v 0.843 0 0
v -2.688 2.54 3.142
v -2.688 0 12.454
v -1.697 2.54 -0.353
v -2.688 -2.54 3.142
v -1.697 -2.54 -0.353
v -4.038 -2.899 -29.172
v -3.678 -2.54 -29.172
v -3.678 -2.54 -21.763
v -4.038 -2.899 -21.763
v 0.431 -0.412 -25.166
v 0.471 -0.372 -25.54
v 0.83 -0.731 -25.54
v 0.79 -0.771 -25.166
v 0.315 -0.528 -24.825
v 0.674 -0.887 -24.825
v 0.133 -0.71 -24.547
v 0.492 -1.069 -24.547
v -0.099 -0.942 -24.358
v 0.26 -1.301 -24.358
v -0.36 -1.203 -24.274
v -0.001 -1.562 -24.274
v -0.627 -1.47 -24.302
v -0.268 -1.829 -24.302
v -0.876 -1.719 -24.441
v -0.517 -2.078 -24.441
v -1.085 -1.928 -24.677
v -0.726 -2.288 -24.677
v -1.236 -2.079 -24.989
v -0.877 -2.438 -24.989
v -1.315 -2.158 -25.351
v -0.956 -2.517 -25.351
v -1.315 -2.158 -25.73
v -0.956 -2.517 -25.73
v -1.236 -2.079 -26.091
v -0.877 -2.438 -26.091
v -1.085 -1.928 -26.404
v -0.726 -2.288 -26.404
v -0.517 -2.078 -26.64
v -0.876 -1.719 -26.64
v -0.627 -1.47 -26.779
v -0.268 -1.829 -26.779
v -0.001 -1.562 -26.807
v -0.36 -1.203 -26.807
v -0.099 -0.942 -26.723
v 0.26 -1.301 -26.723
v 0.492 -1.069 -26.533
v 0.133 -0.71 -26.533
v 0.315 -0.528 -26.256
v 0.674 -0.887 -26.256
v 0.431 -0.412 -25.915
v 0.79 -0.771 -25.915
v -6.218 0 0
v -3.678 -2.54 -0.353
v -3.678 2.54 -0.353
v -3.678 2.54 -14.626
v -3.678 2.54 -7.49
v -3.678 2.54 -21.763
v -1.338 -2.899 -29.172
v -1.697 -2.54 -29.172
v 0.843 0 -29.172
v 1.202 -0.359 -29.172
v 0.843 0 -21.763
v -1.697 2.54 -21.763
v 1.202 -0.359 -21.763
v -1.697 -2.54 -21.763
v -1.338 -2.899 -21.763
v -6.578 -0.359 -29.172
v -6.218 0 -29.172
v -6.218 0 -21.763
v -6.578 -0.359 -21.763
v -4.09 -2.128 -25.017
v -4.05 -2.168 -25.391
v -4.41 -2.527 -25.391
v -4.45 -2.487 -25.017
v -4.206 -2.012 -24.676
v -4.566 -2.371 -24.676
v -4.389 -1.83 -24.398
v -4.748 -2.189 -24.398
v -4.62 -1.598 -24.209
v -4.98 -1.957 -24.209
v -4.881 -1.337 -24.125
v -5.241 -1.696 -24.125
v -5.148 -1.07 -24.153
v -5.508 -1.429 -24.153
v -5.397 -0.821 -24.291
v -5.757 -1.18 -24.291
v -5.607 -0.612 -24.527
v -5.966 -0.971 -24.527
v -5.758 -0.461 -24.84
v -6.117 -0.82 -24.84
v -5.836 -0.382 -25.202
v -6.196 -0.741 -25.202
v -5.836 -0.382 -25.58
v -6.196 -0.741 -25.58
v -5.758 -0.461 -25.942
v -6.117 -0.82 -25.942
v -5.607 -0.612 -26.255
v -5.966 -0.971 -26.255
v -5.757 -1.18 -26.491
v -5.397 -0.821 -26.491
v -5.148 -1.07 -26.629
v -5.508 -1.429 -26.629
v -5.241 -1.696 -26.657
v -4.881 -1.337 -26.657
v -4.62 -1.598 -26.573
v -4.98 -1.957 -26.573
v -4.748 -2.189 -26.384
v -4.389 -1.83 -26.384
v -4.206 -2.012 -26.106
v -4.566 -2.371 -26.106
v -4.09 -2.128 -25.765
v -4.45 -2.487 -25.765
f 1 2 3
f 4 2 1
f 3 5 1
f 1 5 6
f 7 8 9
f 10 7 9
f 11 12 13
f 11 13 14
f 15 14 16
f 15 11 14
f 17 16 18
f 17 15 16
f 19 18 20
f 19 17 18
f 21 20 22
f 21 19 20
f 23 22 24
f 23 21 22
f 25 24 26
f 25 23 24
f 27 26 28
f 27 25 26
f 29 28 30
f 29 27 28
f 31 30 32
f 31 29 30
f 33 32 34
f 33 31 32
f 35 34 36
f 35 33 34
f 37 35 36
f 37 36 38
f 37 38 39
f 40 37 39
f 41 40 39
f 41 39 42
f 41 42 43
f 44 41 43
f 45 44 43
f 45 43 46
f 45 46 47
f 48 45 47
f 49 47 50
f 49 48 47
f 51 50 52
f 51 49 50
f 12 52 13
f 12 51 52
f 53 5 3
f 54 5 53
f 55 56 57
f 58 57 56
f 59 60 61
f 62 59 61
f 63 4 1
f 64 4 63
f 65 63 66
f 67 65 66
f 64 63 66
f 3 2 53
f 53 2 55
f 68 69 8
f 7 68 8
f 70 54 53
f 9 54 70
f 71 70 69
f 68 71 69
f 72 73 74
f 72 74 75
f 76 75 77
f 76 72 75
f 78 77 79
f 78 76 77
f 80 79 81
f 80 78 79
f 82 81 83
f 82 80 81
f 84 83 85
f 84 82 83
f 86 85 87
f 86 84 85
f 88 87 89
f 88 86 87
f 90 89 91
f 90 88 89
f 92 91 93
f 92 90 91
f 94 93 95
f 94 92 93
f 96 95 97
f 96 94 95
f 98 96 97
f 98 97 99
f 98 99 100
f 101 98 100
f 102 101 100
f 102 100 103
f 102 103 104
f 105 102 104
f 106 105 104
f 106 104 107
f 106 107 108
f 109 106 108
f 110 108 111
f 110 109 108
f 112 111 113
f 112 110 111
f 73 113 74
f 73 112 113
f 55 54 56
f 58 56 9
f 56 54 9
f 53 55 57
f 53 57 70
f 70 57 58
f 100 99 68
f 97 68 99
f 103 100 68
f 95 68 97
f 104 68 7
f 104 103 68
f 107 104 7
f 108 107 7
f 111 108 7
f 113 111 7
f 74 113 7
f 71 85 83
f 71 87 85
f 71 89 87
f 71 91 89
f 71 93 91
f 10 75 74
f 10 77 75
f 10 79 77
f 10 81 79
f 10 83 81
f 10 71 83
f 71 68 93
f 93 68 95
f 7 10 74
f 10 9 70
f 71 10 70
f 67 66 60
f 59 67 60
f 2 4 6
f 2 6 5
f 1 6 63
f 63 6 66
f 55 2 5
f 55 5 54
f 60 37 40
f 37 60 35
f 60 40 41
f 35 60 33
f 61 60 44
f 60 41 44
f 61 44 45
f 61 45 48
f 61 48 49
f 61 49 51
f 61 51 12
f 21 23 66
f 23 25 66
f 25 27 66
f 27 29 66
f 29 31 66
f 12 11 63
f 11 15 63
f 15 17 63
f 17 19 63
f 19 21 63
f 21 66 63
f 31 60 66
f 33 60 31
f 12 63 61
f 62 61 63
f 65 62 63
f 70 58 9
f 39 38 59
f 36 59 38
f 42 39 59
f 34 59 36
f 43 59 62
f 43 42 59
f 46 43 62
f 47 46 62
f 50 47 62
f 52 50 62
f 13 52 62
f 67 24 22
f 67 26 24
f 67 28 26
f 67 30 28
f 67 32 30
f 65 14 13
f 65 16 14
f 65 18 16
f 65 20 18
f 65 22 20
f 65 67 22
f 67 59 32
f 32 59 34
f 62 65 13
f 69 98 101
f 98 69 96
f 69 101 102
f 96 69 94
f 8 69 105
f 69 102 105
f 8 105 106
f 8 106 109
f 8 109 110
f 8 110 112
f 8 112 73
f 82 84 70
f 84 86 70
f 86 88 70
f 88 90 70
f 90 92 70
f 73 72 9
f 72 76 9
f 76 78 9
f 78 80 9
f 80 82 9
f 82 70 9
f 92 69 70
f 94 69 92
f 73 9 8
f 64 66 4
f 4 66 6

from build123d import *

# Parameters (mm, degrees)
F1_DEPTH  = 2.54
F2_SIZE   = 2.53999
F7_DEPTH  = 22.86
F8_R      = 1.27
F9_DEPTH  = 0.508
F6_R      = 1.27
F10_DEPTH = 0.508


# Not quite as in the source:
# - a fillet or chamfer is up to 0.001 mm smaller than in the source, because OpenCascade refuses the exact size
# - ends of sketch curves that miss each other by under 0.0002 mm in the source are joined


with BuildPart() as f1:
    # F0 (on Front) → F1 (new body)
    with BuildSketch(Plane.XZ):
        Polygon((-2.687785076, 12.45414), (-6.2184794806, 0), (-6.2184794806, -21.7626541853), (-2.687785076, -21.7626541853), align=None)
    extrude(amount=F1_DEPTH)

    # F2 (size 2.54 in the source; OpenCascade refuses exactly that, so slightly less here)
    f2_edges = [f1.edges().sort_by_distance(p)[0] for p in [
        (-6.218479, -2.54, -10.881327),
        (-4.453132, -2.54, 6.22707),
    ]]
    chamfer(f2_edges, length=F2_SIZE)

    # F3: F1 across face


with BuildPart() as f1_1:
    add(f1.part)
    add(f1.part.mirror(Plane(origin=(-4.3222158923, 0, -7.5368954457), x_dir=(1, 0, 0), z_dir=(0, 1, 0))))

    # F4: F1 across face


with BuildPart() as f1_2:
    add(f1_1.part)
    add(f1_1.part.mirror(Plane(origin=(-2.687785076, 0, -6.8601697168), x_dir=(0, 1, 0), z_dir=(1, 0, 0))))

    # F5 (on face) → F7 (cut)
    with BuildSketch(Plane.XZ.offset(2.54)):
        Polygon((-1.6970906714, -0.3530822644), (-2.687785076, 3.1414843557), (-3.6784794806, -0.3530822644), (-3.6784794806, -21.7626541853), (-1.6970806714, -21.7626541853), align=None)
    extrude(amount=-F7_DEPTH, mode=Mode.SUBTRACT)


with BuildPart() as f9:
    # F8 (on face) → F9 (new body)
    with BuildSketch(Plane(origin=(-3.1092397403, -3.1092397403, 0), x_dir=(0.7071067812, -0.7071067812, 0), z_dir=(-0.7071067812, -0.7071067812, 0))):
        Polygon((-0.805033632, -21.7626541853), (-4.3971219383, -21.7626541853), (-4.3971290094, -29.1721168905), (-0.805026561, -29.1721168905), align=None)
        with Locations((-2.6010777852, -25.3909938037)):
            Circle(F8_R, mode=Mode.SUBTRACT)
    extrude(amount=F9_DEPTH)


with BuildPart() as f10:
    # F6 (on face) → F10 (new body)
    with BuildSketch(Plane(origin=(0.4214546643, -0.4214546643, 0), x_dir=(0.7071067812, 0.7071067812, 0), z_dir=(0.7071067812, -0.7071067812, 0))):
        Polygon((0.5960198311, -21.7626541853), (-2.9960684752, -21.7626541853), (-2.9960755462, -29.1721135853), (0.5960269022, -29.1721135853), align=None)
        with Locations((-1.200024322, -25.5403872579)):
            Circle(F6_R, mode=Mode.SUBTRACT)
    extrude(amount=F10_DEPTH)


solid = Compound([f1_2.part, f9.part, f10.part])
